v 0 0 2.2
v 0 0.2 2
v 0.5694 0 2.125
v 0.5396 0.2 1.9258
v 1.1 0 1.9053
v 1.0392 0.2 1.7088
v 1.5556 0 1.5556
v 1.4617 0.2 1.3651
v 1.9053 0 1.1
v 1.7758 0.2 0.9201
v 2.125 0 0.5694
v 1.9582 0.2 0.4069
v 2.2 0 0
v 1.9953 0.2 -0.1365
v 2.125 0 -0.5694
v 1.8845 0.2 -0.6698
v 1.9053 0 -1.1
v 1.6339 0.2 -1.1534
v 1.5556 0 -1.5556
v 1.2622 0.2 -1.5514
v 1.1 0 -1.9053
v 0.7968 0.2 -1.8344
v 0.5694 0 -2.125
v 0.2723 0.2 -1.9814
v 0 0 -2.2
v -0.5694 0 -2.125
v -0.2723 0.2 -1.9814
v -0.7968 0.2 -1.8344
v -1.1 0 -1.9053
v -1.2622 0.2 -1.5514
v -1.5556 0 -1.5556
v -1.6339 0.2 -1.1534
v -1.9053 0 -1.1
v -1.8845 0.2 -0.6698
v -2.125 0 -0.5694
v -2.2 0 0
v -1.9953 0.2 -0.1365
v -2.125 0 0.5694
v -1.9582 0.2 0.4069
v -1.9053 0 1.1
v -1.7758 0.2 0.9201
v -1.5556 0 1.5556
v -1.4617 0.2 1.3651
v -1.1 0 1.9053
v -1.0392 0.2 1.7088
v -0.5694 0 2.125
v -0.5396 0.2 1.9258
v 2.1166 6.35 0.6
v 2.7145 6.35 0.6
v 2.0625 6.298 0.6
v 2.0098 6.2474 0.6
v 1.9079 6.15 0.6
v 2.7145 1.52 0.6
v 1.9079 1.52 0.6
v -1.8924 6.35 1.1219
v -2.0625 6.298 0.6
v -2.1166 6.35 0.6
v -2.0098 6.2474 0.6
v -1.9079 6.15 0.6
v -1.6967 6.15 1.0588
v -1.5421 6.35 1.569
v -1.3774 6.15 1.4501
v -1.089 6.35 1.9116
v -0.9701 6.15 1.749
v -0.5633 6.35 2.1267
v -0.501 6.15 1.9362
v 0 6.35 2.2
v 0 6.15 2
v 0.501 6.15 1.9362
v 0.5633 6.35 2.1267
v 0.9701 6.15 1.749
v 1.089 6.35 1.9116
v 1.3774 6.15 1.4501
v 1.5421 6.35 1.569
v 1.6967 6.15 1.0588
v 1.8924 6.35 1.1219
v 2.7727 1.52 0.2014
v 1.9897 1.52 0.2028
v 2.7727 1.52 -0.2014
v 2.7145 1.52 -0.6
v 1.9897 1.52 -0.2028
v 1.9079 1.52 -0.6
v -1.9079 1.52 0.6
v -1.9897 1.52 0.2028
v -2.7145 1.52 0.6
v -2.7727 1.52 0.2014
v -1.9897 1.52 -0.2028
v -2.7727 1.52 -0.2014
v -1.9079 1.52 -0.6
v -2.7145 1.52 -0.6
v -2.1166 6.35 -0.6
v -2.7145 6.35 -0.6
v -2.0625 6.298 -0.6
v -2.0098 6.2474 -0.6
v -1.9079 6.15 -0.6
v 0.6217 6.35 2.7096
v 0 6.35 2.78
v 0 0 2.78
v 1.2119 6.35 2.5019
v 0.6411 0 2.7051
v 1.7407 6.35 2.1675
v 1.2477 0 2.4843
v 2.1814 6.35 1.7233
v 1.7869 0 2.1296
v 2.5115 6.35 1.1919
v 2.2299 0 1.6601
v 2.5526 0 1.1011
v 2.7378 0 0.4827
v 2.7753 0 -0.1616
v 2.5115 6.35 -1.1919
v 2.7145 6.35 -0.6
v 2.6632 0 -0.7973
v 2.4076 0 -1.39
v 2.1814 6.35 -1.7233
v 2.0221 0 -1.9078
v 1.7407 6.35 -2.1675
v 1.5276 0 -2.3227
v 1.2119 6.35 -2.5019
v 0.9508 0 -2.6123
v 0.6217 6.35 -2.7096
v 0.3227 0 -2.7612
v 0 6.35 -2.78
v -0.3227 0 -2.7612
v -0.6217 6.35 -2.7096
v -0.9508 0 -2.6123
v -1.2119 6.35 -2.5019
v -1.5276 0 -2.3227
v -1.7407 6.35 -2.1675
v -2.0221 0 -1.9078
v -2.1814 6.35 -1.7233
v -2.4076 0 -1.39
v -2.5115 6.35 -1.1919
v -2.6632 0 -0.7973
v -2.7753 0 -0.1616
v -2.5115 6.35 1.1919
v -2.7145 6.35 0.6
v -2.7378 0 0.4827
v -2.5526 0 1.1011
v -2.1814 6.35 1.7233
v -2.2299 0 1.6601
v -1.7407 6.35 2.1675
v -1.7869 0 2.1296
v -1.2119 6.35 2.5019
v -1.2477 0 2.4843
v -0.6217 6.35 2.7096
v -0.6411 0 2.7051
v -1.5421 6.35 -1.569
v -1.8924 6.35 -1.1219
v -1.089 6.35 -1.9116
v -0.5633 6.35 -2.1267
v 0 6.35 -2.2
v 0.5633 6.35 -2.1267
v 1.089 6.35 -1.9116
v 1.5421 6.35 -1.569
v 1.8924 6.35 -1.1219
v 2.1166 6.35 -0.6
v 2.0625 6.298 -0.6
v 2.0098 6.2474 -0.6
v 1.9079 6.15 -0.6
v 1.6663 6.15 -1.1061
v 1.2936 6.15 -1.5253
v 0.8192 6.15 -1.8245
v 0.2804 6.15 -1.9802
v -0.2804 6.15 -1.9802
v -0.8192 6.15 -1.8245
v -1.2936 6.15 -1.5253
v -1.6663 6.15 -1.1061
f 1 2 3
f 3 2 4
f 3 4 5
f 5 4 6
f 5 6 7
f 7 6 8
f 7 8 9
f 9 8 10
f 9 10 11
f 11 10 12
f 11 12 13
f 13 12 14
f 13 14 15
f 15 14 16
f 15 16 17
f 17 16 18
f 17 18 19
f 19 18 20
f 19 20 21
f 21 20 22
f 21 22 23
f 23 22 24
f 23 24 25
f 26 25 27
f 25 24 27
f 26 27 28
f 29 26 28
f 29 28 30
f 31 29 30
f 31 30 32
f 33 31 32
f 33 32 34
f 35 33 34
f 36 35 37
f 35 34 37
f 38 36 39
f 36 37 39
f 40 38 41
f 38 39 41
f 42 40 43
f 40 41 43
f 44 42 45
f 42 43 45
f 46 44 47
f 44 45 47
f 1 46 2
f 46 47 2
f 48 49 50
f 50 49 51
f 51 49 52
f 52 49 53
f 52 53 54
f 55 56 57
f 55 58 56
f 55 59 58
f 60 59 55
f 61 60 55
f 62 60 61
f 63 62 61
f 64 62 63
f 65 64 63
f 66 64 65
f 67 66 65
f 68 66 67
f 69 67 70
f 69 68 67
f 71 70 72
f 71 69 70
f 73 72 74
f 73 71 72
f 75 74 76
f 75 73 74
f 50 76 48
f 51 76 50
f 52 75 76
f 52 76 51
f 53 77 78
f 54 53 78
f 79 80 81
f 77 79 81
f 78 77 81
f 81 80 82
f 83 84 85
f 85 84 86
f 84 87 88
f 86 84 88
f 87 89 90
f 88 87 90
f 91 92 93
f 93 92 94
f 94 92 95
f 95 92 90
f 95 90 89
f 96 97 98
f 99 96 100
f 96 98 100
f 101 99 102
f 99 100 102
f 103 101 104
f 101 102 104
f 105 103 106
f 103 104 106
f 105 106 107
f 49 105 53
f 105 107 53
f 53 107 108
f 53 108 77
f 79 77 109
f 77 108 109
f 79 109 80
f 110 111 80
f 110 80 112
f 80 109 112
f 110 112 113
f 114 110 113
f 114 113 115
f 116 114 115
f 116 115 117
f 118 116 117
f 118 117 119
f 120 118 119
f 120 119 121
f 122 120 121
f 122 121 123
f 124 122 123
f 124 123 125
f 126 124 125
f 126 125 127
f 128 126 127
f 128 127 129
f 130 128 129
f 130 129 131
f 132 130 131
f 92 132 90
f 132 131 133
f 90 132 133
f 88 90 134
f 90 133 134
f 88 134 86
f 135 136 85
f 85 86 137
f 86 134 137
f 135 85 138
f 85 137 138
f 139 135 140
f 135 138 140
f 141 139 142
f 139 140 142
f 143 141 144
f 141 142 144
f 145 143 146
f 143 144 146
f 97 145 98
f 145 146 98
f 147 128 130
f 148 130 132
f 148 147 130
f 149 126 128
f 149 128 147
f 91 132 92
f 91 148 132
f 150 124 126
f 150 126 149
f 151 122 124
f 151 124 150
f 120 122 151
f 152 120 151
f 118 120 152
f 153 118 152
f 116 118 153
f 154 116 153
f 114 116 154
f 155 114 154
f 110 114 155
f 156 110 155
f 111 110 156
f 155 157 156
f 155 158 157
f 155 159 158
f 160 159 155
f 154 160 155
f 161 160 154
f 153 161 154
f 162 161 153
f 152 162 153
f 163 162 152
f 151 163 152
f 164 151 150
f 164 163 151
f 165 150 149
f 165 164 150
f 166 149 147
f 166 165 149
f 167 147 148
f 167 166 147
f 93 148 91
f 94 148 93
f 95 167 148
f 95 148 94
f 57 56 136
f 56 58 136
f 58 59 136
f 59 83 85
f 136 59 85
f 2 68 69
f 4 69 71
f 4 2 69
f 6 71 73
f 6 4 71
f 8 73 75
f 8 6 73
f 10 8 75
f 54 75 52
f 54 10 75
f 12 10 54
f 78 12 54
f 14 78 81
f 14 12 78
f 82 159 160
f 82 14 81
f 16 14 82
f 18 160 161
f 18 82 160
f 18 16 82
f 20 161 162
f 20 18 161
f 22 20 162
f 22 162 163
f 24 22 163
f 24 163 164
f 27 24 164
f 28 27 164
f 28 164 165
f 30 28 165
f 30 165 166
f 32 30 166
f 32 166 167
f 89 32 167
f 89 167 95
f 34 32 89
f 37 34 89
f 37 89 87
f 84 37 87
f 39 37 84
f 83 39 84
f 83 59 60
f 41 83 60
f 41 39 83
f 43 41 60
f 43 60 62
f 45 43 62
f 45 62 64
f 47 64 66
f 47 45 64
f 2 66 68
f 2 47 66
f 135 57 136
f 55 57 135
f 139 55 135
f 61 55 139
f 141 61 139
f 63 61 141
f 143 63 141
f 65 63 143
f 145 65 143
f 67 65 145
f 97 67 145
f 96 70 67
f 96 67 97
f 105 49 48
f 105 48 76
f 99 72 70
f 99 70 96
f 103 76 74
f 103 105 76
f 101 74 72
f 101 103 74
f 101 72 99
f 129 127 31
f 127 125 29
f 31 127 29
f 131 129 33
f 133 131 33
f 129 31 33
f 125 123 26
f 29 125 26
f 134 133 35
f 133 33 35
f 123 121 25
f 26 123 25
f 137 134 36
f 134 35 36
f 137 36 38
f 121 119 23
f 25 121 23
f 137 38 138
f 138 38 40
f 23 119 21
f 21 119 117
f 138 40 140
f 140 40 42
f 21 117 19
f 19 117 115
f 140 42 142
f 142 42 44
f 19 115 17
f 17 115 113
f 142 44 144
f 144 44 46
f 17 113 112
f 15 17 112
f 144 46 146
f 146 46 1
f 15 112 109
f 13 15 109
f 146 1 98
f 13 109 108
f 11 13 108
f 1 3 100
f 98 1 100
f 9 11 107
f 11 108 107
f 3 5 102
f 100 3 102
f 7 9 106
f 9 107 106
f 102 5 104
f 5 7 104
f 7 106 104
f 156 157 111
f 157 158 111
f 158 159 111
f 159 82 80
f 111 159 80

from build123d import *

# Parameters (mm, degrees)
SKETCH_1_R          = 2.78
SKETCH_1_R_2        = 2
EXTRUDE_1_DEPTH     = 6.35
CUT_EXTRUDE_START   = -4.83
CUT_EXTRUDE_1_DEPTH = 4.83
CHAMFER_1_SIZE      = 0.2


with BuildPart() as part:
    # 草图1 → 凸台-拉伸1 (new body)
    with BuildSketch(Plane(origin=(0, 0, 0), x_dir=(1, 0, 0), z_dir=(0, 1, 0))):
        with Locations(Location((0, 0, 0), (0, 0, 270))):
            Circle(SKETCH_1_R)
        with Locations(Location((0, 0, 0), (0, 0, 270))):
            Circle(SKETCH_1_R_2, mode=Mode.SUBTRACT)
    extrude(amount=EXTRUDE_1_DEPTH)

    # 草图2 → 切除-拉伸1 (cut)
    with BuildSketch(Plane(origin=(0, 6.35, 0), x_dir=(1, 0, 0), z_dir=(0, 1, 0)).offset(CUT_EXTRUDE_START)):
        with BuildLine():
            Line((-2.714479692, 0.6), (2.714479692, 0.6))
            ThreePointArc((2.714479692, 0.6), (2.78, 0), (2.714479692, -0.6))
            Line((2.714479692, -0.6), (-2.714479692, -0.6))
            ThreePointArc((-2.714479692, -0.6), (-2.78, 0), (-2.714479692, 0.6))
        make_face()
    extrude(amount=CUT_EXTRUDE_1_DEPTH, mode=Mode.SUBTRACT)

    # 倒角1
    chamfer_1_edges = [part.edges().sort_by_distance(p)[0] for p in [
        (-1.183215957, 6.35, 1.61245155),
        (0, 0, -2),
        (0, 6.35, -2),
    ]]
    chamfer(chamfer_1_edges, length=CHAMFER_1_SIZE)


solid = part.part
